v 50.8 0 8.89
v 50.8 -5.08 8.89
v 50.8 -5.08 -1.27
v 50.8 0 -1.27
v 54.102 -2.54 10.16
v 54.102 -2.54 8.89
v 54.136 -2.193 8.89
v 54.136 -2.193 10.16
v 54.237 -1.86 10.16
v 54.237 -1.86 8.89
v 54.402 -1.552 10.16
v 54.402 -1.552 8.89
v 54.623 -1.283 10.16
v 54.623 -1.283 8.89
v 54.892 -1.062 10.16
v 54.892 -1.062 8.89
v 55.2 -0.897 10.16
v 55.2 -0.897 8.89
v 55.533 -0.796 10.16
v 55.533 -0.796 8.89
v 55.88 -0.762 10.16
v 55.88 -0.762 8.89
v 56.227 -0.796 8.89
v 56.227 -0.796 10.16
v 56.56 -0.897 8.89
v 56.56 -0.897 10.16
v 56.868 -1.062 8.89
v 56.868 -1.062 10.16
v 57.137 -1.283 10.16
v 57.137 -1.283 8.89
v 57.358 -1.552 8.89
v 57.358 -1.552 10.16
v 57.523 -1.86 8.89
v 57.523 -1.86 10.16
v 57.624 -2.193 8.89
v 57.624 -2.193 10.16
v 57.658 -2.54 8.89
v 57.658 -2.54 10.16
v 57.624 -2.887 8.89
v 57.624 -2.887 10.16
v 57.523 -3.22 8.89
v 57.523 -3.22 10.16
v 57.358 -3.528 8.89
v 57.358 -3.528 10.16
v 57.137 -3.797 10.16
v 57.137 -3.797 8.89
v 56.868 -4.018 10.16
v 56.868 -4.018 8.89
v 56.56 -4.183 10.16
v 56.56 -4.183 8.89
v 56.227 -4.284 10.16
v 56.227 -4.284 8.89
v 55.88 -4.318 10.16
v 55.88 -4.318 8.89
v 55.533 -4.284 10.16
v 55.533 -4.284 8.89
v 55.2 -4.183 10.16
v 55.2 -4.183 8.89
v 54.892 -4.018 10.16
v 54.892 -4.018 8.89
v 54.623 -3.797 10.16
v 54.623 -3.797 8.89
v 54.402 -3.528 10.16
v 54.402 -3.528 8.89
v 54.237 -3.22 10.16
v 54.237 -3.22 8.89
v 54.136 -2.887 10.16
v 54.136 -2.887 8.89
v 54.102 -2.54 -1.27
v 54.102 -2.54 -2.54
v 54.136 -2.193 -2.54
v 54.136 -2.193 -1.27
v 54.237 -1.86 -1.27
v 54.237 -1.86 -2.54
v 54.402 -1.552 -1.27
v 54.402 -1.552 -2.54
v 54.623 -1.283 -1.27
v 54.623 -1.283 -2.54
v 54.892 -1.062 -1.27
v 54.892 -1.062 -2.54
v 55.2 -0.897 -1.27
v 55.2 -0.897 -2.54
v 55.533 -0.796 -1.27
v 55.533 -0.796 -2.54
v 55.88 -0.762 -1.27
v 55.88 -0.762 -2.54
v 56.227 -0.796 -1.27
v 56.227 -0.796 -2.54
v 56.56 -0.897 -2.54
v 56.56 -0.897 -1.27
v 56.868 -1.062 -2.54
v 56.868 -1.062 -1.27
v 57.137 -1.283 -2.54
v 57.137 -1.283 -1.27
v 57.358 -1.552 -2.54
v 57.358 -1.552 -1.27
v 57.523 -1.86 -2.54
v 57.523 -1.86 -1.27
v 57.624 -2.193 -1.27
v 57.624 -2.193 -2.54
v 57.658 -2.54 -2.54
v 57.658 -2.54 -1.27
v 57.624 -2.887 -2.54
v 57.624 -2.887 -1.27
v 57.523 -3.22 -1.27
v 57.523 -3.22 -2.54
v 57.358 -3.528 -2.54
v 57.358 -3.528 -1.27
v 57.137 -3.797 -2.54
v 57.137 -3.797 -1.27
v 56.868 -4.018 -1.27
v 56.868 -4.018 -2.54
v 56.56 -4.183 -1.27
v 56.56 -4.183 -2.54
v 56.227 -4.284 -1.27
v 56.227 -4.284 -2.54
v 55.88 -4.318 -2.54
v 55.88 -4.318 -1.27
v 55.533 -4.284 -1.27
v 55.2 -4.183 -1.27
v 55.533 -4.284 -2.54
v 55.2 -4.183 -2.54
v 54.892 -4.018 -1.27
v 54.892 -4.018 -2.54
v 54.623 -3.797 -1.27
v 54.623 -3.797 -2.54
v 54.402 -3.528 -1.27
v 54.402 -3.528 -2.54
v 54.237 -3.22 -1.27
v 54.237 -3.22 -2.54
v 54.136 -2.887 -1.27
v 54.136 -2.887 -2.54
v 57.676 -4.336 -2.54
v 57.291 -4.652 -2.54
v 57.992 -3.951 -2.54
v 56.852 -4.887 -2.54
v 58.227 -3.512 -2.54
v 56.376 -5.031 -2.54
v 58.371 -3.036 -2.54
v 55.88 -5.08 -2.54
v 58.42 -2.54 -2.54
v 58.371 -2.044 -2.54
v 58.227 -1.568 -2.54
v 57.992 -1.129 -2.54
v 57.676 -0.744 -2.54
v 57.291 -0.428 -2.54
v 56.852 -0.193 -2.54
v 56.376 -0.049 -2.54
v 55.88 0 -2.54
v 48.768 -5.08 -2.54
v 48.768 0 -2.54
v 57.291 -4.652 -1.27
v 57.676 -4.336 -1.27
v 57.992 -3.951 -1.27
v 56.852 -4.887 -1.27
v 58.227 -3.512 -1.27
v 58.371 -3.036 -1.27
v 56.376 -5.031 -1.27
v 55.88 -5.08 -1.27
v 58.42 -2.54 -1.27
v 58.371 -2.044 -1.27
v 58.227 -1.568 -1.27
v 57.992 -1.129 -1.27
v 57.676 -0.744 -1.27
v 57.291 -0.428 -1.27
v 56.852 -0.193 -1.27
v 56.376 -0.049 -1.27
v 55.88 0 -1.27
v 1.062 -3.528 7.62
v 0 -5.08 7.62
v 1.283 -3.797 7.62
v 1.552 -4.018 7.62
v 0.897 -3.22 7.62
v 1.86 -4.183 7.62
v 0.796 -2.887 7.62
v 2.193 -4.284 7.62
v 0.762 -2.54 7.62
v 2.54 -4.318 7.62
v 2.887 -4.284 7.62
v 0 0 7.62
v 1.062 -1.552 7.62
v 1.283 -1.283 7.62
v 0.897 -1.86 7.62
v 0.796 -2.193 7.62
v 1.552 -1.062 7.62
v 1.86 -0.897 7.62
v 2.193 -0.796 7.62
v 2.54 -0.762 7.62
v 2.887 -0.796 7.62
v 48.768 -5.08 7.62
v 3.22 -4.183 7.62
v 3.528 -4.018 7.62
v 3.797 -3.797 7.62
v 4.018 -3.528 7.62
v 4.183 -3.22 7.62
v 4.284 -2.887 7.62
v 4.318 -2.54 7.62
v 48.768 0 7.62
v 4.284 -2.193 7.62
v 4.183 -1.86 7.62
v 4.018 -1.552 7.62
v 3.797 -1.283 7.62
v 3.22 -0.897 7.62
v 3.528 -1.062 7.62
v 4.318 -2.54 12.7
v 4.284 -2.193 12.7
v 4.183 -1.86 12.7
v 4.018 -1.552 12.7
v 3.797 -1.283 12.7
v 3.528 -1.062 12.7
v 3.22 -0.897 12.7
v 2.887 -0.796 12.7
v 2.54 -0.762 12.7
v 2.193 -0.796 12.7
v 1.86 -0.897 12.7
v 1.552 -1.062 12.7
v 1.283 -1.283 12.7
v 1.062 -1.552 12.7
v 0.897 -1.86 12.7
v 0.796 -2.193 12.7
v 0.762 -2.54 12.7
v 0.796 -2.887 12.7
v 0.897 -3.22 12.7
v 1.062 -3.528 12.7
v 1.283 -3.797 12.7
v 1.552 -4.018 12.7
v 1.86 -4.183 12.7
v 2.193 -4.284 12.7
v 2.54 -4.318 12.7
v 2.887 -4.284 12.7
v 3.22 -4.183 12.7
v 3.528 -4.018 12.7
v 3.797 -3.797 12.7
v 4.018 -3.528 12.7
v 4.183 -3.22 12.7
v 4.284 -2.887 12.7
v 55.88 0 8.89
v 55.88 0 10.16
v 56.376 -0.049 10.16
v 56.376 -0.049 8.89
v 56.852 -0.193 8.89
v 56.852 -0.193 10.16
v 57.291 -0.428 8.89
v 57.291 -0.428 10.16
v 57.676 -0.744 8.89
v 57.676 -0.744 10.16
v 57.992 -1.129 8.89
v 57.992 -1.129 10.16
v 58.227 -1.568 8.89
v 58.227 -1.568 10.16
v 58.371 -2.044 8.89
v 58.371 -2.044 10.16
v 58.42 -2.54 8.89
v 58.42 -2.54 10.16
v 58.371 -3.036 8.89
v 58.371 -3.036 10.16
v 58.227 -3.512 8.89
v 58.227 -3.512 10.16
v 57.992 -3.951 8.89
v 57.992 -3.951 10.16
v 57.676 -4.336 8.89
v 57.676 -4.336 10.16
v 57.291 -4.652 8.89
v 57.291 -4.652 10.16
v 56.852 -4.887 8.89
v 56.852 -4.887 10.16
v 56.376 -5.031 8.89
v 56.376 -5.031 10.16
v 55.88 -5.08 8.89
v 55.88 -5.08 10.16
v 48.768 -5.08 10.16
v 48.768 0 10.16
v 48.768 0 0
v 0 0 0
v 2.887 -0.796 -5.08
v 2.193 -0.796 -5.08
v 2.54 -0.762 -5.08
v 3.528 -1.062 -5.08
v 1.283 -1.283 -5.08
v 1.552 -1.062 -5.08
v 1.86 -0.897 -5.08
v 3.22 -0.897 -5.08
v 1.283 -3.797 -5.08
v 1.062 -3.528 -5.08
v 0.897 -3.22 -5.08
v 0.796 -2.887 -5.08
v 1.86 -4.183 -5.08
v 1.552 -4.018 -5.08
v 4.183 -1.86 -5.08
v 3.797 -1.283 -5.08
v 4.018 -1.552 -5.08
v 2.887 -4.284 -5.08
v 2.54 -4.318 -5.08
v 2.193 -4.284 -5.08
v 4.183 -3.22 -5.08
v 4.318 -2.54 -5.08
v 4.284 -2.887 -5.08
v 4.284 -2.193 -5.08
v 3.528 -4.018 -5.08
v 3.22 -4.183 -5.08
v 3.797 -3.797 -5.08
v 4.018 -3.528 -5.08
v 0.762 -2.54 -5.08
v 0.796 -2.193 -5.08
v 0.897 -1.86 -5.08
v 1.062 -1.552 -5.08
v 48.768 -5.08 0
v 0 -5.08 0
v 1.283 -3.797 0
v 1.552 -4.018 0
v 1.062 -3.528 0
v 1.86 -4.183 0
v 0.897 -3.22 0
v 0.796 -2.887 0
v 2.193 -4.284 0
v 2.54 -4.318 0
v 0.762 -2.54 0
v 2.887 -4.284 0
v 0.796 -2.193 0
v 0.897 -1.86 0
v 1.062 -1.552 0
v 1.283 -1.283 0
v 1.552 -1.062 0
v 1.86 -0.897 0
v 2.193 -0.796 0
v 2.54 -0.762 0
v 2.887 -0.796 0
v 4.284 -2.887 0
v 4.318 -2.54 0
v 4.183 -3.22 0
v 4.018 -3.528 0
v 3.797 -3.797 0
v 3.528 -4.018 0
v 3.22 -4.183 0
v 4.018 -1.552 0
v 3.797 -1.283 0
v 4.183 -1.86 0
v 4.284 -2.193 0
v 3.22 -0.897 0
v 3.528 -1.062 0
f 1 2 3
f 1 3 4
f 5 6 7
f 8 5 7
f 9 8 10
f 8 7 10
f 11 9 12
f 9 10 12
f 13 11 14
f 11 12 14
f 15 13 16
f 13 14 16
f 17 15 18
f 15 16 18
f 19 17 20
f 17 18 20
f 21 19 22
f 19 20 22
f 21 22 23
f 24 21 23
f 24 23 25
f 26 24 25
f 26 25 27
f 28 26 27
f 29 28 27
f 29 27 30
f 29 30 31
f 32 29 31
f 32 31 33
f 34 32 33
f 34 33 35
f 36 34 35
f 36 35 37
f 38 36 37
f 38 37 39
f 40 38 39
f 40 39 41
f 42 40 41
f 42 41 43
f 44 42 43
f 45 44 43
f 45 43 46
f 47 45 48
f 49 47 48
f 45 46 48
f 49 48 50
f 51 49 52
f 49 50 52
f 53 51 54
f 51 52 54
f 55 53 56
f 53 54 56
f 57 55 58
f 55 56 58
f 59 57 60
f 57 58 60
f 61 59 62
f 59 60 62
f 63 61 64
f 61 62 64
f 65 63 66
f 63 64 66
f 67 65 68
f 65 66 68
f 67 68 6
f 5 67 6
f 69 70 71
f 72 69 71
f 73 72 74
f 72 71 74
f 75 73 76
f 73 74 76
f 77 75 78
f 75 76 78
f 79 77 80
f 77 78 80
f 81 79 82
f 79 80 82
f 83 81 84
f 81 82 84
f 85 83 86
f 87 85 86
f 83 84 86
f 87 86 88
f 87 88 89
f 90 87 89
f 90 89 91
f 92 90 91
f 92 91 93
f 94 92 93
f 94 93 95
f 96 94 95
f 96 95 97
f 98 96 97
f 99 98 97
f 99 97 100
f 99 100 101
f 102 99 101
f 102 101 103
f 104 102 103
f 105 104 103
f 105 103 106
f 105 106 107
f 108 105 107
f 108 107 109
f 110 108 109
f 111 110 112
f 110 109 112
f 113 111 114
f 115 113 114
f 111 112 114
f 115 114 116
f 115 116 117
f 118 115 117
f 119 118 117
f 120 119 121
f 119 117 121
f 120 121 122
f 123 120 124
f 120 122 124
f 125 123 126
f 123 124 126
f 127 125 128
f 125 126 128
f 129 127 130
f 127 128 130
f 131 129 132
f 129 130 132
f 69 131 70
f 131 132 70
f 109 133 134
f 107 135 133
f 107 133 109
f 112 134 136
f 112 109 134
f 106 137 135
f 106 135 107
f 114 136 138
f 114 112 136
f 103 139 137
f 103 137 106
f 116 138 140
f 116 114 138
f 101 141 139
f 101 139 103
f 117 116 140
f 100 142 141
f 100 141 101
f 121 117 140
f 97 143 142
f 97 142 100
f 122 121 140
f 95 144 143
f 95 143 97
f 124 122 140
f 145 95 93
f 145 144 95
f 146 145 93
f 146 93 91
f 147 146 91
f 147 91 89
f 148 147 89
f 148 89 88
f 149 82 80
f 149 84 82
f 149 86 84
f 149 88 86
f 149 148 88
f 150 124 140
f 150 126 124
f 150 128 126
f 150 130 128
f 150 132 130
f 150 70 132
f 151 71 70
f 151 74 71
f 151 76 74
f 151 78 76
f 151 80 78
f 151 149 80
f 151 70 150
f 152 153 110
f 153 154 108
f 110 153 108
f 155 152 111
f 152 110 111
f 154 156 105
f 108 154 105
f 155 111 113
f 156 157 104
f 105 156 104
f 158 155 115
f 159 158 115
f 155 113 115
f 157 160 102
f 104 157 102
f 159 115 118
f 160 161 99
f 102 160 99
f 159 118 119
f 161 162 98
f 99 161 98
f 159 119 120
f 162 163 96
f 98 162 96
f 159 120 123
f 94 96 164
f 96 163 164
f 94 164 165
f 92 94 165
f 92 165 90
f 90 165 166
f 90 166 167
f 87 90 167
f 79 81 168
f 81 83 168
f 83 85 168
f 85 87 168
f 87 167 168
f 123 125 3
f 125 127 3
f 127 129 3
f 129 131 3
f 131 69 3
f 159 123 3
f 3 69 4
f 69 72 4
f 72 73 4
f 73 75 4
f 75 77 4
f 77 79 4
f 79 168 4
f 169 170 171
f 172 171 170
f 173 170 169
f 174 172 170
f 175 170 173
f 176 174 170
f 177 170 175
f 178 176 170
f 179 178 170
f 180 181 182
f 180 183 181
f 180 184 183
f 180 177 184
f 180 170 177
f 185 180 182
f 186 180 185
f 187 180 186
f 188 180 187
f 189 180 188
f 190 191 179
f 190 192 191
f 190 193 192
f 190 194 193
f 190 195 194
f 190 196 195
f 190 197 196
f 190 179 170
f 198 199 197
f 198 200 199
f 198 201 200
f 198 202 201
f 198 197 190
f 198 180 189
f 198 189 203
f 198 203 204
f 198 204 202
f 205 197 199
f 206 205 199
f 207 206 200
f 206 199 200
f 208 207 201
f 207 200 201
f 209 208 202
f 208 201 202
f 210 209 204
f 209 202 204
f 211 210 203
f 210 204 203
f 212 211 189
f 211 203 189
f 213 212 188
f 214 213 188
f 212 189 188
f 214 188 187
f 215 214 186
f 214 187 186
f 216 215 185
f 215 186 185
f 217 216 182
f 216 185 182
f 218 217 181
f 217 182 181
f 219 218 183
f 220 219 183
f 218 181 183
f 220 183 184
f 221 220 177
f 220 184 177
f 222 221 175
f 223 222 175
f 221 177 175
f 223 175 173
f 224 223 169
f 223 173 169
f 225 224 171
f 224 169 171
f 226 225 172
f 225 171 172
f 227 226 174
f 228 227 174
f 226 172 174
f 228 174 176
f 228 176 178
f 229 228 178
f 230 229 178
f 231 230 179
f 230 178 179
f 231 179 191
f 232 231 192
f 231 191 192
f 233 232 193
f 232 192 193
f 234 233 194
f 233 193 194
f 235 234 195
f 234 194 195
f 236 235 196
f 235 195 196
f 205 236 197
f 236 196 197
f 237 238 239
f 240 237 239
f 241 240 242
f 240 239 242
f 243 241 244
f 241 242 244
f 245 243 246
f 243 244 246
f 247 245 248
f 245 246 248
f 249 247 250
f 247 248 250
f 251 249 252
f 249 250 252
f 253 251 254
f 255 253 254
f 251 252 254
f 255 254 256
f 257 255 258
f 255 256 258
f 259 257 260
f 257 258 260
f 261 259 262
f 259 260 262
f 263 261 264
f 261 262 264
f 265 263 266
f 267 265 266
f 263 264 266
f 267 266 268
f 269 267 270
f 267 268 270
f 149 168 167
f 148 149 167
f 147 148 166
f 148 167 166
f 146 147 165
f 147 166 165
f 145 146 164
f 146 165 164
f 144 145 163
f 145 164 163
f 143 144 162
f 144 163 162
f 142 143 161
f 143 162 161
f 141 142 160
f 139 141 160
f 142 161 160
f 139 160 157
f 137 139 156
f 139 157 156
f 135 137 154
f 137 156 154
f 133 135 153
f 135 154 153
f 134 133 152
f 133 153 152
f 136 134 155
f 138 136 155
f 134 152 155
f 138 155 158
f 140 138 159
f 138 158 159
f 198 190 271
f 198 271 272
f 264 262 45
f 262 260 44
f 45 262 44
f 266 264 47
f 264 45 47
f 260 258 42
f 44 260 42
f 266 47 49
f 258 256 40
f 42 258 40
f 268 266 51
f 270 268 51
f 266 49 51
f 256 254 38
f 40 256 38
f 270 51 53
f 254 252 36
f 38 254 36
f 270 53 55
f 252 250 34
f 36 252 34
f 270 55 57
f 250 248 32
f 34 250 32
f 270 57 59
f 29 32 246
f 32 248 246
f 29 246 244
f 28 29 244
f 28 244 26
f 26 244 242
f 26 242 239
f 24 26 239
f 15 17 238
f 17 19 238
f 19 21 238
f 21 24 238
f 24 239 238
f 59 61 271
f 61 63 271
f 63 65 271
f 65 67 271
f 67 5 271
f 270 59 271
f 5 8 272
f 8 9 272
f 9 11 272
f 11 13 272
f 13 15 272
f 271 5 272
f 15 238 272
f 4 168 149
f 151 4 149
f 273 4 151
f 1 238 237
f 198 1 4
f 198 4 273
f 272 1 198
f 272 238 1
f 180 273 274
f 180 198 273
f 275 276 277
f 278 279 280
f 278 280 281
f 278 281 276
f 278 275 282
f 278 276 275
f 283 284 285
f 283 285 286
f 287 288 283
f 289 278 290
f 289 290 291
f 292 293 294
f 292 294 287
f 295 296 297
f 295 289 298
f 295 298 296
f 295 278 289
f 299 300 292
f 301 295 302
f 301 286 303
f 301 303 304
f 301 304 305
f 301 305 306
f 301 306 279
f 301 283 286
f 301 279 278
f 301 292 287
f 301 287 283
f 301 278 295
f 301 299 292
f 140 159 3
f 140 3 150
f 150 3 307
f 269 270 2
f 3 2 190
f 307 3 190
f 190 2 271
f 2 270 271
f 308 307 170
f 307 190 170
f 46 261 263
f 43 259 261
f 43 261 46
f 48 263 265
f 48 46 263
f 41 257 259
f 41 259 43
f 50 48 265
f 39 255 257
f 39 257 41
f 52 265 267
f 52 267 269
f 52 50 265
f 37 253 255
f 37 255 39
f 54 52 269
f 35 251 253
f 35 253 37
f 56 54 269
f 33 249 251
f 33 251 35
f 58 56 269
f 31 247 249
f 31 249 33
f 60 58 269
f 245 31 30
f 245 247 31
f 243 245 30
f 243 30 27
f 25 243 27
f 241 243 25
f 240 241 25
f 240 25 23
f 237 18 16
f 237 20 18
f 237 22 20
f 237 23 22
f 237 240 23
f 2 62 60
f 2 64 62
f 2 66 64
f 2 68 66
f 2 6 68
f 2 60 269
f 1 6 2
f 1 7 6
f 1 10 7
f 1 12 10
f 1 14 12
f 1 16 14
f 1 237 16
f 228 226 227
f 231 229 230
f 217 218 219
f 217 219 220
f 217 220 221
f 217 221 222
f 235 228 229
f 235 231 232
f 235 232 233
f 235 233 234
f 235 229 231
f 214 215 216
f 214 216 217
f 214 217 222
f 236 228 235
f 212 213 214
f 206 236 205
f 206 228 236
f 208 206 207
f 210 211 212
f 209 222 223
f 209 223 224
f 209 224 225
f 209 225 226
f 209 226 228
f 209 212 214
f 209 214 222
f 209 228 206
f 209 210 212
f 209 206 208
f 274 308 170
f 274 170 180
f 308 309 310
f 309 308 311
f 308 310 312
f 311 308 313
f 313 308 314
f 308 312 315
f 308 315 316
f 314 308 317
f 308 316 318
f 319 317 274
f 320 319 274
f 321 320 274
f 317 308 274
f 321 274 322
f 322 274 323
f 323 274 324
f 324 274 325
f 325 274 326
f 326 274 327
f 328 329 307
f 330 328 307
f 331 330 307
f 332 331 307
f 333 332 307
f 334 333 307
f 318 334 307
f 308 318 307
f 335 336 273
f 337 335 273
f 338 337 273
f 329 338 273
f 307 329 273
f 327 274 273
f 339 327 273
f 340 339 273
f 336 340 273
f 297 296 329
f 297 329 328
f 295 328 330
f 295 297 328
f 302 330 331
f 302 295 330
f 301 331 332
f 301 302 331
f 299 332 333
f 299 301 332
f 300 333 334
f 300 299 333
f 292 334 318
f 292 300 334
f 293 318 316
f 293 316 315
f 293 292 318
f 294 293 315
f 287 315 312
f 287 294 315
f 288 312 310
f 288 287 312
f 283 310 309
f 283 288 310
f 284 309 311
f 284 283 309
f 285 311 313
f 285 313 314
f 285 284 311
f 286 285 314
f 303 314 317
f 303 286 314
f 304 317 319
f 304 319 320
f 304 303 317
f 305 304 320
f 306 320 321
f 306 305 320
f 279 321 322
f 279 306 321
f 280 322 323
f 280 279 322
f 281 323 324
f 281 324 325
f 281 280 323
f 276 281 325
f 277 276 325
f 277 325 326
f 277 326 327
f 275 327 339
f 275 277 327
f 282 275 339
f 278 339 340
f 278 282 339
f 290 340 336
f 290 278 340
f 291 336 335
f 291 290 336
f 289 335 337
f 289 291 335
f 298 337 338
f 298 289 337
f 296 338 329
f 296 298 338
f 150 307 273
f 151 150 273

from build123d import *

# Parameters (mm, degrees)
SKETCH1_W           = 50.8
SKETCH1_H           = 5.08
BOSS_EXTRUDE1_DEPTH = 7.62
SKETCH2_R           = 1.778
BOSS_EXTRUDE2_DEPTH = 5.08
BOSS_EXTRUDE3_START = 5.08
SKETCH3_R           = 1.778
BOSS_EXTRUDE3_DEPTH = 5.08
SKETCH4_W           = 2.032
SKETCH4_H           = 5.08
BOSS_EXTRUDE4_DEPTH = 2.54
BOSS_EXTRUDE5_DEPTH = 1.27
SKETCH6_W           = 2.032
SKETCH6_H           = 5.08
BOSS_EXTRUDE6_DEPTH = 2.54
BOSS_EXTRUDE7_START = -1.27
BOSS_EXTRUDE7_DEPTH = 1.27
SKETCH8_R           = 1.778
CUT_EXTRUDE1_DEPTH  = 61.588451045


with BuildPart() as part:
    # Sketch1 → Boss-Extrude1 (new body)
    with BuildSketch(Plane.XY):
        with Locations((25.4, -2.54)):
            Rectangle(SKETCH1_W, SKETCH1_H)
    extrude(amount=BOSS_EXTRUDE1_DEPTH)

    # Sketch2 → Boss-Extrude2 (add)
    with BuildSketch(Plane.XY.offset(7.62)):
        with Locations((2.54, -2.54)):
            Circle(SKETCH2_R)
    extrude(amount=BOSS_EXTRUDE2_DEPTH)

    # Sketch3 → Boss-Extrude3 (add)
    with BuildSketch(Plane(origin=(0, 0, 0), x_dir=(-1, 0, 0), z_dir=(0, 0, -1)).offset(BOSS_EXTRUDE3_START)):
        with Locations(Location((-2.54, -2.54, 0), (0, 0, 180))):
            Circle(SKETCH3_R)
    extrude(amount=-BOSS_EXTRUDE3_DEPTH)

    # Sketch4 → Boss-Extrude4 (add)
    with BuildSketch(Plane.XY.offset(7.62)):
        with Locations((49.784, -2.54)):
            Rectangle(SKETCH4_W, SKETCH4_H)
    extrude(amount=BOSS_EXTRUDE4_DEPTH)

    # Sketch5 → Boss-Extrude5 (add)
    with BuildSketch(Plane.XY.offset(10.16)):
        with BuildLine():
            Line((50.8, 0), (55.88, 0))
            ThreePointArc((55.88, 0), (58.42, -2.54), (55.88, -5.08))
            Line((55.88, -5.08), (50.8, -5.08))
            Line((50.8, -5.08), (50.8, 0))
        make_face()
    extrude(amount=-BOSS_EXTRUDE5_DEPTH)

    # Sketch6 → Boss-Extrude6 (add)
    with BuildSketch(Plane(origin=(0, 0, 0), x_dir=(-1, 0, 0), z_dir=(0, 0, -1))):
        with Locations((-49.784, -2.54)):
            Rectangle(SKETCH6_W, SKETCH6_H)
    extrude(amount=BOSS_EXTRUDE6_DEPTH)

    # Sketch7 → Boss-Extrude7 (add)
    with BuildSketch(Plane(origin=(0, 0, -2.54), x_dir=(-1, 0, 0), z_dir=(0, 0, -1)).offset(BOSS_EXTRUDE7_START)):
        with BuildLine():
            Line((-48.768, 0), (-55.88, 0))
            ThreePointArc((-55.88, 0), (-58.42, -2.54), (-55.88, -5.08))
            Line((-55.88, -5.08), (-48.768, -5.08))
            Line((-48.768, -5.08), (-48.768, 0))
        make_face()
    extrude(amount=BOSS_EXTRUDE7_DEPTH)

    # Sketch8 → Cut-Extrude1 (cut, through all)
    with BuildSketch(Plane(origin=(0, 0, -2.54), x_dir=(-1, 0, 0), z_dir=(0, 0, -1))):
        with Locations((-55.88, -2.54)):
            Circle(SKETCH8_R)
    extrude(amount=-CUT_EXTRUDE1_DEPTH, mode=Mode.SUBTRACT)


solid = part.part
